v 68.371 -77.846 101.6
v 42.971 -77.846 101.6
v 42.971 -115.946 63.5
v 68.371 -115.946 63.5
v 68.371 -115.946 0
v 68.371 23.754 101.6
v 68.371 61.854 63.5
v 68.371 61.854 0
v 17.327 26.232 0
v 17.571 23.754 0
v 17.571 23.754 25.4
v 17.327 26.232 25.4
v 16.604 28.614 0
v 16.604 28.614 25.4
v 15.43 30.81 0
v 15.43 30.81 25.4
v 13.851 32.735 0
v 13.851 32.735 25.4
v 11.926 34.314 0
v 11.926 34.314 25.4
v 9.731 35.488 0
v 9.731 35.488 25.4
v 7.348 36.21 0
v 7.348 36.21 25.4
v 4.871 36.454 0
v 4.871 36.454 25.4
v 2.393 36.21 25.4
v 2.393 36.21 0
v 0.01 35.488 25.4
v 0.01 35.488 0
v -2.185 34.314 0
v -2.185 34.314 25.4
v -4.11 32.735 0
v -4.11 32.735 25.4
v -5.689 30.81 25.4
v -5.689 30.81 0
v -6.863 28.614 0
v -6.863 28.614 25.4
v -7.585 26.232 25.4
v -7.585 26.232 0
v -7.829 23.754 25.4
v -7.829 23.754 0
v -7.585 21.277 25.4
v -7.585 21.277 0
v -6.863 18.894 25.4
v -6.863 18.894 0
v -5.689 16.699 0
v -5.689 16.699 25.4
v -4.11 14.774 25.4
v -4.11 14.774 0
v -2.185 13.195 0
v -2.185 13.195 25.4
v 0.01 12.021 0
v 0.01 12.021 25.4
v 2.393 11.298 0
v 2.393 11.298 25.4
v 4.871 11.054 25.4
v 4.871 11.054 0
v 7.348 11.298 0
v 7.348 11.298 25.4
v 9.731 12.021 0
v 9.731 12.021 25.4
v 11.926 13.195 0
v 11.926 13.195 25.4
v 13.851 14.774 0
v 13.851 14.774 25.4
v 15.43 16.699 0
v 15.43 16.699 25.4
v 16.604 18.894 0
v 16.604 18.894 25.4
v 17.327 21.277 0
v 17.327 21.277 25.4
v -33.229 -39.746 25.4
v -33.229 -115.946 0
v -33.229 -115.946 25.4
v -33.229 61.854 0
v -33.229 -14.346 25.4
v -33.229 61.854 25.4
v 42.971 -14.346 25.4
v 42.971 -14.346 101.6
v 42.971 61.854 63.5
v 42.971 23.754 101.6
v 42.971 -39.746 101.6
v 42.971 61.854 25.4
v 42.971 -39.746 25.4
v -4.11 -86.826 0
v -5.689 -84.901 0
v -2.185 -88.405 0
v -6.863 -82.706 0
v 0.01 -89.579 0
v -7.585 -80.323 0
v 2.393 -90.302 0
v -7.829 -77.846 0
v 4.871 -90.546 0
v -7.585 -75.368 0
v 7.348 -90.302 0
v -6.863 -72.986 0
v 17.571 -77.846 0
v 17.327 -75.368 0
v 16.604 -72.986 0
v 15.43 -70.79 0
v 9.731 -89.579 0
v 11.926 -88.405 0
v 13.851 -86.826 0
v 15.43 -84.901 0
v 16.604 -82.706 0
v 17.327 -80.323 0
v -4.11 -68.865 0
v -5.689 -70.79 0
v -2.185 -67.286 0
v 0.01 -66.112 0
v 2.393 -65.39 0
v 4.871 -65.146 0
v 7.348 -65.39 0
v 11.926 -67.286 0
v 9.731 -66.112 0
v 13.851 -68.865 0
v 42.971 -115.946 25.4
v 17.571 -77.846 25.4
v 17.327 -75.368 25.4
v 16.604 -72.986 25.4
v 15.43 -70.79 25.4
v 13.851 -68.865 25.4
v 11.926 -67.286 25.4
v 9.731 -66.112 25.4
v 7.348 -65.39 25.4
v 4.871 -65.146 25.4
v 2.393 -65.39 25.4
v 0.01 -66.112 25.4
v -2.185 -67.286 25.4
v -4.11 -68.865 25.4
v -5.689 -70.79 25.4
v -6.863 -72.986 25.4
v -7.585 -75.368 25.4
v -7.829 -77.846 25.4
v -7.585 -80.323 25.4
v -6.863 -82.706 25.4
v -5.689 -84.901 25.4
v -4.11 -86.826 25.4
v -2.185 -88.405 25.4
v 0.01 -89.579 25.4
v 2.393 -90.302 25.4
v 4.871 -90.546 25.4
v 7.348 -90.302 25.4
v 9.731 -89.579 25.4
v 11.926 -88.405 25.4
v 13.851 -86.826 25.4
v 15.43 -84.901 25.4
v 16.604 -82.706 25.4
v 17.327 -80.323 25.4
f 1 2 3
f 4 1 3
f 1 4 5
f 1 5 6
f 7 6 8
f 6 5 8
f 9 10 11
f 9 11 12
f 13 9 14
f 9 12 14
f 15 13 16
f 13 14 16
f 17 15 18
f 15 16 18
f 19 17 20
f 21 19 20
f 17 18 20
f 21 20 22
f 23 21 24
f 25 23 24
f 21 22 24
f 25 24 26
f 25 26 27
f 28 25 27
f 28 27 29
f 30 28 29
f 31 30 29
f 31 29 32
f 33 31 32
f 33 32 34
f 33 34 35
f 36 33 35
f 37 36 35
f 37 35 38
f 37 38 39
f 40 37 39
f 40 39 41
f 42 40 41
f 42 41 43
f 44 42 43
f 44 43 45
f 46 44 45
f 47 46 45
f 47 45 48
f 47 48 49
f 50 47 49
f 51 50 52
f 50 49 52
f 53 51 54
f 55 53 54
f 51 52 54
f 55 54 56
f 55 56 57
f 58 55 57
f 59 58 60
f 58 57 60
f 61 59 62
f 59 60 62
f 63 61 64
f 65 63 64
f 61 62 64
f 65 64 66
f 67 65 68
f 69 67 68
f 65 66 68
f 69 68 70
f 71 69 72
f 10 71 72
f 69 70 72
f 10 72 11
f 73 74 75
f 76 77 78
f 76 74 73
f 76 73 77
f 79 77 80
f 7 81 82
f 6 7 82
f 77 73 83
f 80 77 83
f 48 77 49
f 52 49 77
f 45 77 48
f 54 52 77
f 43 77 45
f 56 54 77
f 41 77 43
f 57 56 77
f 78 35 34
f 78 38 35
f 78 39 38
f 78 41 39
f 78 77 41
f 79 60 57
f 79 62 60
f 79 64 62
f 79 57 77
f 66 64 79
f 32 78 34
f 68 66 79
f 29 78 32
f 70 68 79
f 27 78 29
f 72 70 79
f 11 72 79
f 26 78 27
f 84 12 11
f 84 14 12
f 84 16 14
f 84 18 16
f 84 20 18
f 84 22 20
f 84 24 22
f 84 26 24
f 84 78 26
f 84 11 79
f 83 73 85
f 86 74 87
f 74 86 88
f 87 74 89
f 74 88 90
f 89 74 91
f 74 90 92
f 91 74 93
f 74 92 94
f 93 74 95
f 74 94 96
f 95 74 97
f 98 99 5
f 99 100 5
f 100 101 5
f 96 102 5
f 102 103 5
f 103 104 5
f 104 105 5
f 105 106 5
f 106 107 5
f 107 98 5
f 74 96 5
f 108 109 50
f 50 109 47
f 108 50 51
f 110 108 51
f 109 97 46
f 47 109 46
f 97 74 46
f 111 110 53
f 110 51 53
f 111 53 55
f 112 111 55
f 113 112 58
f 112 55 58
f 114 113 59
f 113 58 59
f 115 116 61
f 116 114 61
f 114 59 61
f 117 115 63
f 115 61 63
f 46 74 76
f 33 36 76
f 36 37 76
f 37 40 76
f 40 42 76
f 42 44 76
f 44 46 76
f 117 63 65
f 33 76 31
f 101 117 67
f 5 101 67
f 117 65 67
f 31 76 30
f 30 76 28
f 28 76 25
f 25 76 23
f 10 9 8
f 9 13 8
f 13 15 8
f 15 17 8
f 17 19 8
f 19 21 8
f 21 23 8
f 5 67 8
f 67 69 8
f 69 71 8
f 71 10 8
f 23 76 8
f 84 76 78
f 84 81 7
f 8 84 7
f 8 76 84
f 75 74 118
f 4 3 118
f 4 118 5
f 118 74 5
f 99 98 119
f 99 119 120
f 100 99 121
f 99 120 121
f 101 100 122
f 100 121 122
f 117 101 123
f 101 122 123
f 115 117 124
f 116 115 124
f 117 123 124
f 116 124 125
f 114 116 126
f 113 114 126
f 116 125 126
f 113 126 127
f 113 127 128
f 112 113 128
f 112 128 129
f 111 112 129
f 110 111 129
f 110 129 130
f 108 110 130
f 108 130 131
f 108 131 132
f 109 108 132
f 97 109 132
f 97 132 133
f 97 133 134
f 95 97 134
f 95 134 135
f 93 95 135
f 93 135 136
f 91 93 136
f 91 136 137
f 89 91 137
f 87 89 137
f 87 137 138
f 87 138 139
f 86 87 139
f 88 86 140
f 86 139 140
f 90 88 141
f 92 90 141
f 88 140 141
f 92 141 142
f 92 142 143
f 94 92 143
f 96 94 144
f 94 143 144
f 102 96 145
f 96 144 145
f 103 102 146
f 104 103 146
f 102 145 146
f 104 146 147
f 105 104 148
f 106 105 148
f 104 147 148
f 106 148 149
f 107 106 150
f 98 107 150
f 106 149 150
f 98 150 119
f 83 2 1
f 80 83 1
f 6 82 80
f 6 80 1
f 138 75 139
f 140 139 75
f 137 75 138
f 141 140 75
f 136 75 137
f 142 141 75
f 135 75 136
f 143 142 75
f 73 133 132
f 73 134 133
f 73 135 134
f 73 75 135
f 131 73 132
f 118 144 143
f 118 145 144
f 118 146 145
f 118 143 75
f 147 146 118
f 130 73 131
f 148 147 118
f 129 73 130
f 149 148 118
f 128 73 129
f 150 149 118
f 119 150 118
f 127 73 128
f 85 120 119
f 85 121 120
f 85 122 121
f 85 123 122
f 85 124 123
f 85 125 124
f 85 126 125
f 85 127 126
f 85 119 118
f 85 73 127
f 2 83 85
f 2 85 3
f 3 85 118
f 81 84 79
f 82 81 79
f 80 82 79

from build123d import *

# Parameters (mm, degrees)
F0_W      = 76.2
F0_H      = 25.4
F1_DEPTH  = 101.6
F0_H_2    = 76.2
F2_DEPTH  = 25.4
F4_DEPTH  = 101.601
F7_DEPTH  = 25.401
F9_R      = 12.7
F8_R      = 12.7
F10_DEPTH = 25.401


with BuildPart() as f1:
    # F0 (on Top) → F1 (new body)
    with BuildSketch(Plane.XY):
        Polygon((68.37053, 61.854359), (42.97053, 61.854359), (42.97053, -14.345641), (42.97053, -39.745641), (42.97053, -115.945641), (68.37053, -115.945641), align=None)
        with Locations((4.87053, -27.045641)):
            Rectangle(F0_W, F0_H)
    extrude(amount=F1_DEPTH)

    # F0 (on Top) → F2 (join)
    with BuildSketch(Plane.XY):
        with Locations((4.87053, 23.754359)):
            Rectangle(F0_W, F0_H_2)
        with Locations((4.87053, -77.845641)):
            Rectangle(F0_W, F0_H_2)
    extrude(amount=F2_DEPTH)

    # F3 (on face) → F4 (cut, through all)
    with BuildSketch(Plane.XZ.offset(39.745641)):
        Polygon((-33.22947, 101.6), (-33.22947, 25.4), (42.97053, 101.6), align=None)
    extrude(amount=-F4_DEPTH, mode=Mode.SUBTRACT)

    # F6 (on face) + F5 (on face) → F7 (cut, through all)
    with BuildSketch(Plane(origin=(42.97053, 0, 0), x_dir=(0, -1, 0), z_dir=(-1, 0, 0))):
        Polygon((-61.854359, 63.5), (-23.754359, 101.6), (-61.854359, 101.6), align=None)
    with BuildSketch(Plane(origin=(42.97053, 0, 0), x_dir=(0, -1, 0), z_dir=(-1, 0, 0))):
        Polygon((115.945641, 101.6), (77.845641, 101.6), (115.945641, 63.5), align=None)
    extrude(amount=-F7_DEPTH, mode=Mode.SUBTRACT)

    # F9 (on face) + F8 (on face) → F10 (cut, through all)
    with BuildSketch(Plane.XY.offset(25.4)):
        with Locations((4.87053, 23.754359)):
            Circle(F9_R)
    with BuildSketch(Plane.XY.offset(25.4)):
        with Locations((4.87053, -77.845641)):
            Circle(F8_R)
    extrude(amount=-F10_DEPTH, mode=Mode.SUBTRACT)


solid = f1.part
